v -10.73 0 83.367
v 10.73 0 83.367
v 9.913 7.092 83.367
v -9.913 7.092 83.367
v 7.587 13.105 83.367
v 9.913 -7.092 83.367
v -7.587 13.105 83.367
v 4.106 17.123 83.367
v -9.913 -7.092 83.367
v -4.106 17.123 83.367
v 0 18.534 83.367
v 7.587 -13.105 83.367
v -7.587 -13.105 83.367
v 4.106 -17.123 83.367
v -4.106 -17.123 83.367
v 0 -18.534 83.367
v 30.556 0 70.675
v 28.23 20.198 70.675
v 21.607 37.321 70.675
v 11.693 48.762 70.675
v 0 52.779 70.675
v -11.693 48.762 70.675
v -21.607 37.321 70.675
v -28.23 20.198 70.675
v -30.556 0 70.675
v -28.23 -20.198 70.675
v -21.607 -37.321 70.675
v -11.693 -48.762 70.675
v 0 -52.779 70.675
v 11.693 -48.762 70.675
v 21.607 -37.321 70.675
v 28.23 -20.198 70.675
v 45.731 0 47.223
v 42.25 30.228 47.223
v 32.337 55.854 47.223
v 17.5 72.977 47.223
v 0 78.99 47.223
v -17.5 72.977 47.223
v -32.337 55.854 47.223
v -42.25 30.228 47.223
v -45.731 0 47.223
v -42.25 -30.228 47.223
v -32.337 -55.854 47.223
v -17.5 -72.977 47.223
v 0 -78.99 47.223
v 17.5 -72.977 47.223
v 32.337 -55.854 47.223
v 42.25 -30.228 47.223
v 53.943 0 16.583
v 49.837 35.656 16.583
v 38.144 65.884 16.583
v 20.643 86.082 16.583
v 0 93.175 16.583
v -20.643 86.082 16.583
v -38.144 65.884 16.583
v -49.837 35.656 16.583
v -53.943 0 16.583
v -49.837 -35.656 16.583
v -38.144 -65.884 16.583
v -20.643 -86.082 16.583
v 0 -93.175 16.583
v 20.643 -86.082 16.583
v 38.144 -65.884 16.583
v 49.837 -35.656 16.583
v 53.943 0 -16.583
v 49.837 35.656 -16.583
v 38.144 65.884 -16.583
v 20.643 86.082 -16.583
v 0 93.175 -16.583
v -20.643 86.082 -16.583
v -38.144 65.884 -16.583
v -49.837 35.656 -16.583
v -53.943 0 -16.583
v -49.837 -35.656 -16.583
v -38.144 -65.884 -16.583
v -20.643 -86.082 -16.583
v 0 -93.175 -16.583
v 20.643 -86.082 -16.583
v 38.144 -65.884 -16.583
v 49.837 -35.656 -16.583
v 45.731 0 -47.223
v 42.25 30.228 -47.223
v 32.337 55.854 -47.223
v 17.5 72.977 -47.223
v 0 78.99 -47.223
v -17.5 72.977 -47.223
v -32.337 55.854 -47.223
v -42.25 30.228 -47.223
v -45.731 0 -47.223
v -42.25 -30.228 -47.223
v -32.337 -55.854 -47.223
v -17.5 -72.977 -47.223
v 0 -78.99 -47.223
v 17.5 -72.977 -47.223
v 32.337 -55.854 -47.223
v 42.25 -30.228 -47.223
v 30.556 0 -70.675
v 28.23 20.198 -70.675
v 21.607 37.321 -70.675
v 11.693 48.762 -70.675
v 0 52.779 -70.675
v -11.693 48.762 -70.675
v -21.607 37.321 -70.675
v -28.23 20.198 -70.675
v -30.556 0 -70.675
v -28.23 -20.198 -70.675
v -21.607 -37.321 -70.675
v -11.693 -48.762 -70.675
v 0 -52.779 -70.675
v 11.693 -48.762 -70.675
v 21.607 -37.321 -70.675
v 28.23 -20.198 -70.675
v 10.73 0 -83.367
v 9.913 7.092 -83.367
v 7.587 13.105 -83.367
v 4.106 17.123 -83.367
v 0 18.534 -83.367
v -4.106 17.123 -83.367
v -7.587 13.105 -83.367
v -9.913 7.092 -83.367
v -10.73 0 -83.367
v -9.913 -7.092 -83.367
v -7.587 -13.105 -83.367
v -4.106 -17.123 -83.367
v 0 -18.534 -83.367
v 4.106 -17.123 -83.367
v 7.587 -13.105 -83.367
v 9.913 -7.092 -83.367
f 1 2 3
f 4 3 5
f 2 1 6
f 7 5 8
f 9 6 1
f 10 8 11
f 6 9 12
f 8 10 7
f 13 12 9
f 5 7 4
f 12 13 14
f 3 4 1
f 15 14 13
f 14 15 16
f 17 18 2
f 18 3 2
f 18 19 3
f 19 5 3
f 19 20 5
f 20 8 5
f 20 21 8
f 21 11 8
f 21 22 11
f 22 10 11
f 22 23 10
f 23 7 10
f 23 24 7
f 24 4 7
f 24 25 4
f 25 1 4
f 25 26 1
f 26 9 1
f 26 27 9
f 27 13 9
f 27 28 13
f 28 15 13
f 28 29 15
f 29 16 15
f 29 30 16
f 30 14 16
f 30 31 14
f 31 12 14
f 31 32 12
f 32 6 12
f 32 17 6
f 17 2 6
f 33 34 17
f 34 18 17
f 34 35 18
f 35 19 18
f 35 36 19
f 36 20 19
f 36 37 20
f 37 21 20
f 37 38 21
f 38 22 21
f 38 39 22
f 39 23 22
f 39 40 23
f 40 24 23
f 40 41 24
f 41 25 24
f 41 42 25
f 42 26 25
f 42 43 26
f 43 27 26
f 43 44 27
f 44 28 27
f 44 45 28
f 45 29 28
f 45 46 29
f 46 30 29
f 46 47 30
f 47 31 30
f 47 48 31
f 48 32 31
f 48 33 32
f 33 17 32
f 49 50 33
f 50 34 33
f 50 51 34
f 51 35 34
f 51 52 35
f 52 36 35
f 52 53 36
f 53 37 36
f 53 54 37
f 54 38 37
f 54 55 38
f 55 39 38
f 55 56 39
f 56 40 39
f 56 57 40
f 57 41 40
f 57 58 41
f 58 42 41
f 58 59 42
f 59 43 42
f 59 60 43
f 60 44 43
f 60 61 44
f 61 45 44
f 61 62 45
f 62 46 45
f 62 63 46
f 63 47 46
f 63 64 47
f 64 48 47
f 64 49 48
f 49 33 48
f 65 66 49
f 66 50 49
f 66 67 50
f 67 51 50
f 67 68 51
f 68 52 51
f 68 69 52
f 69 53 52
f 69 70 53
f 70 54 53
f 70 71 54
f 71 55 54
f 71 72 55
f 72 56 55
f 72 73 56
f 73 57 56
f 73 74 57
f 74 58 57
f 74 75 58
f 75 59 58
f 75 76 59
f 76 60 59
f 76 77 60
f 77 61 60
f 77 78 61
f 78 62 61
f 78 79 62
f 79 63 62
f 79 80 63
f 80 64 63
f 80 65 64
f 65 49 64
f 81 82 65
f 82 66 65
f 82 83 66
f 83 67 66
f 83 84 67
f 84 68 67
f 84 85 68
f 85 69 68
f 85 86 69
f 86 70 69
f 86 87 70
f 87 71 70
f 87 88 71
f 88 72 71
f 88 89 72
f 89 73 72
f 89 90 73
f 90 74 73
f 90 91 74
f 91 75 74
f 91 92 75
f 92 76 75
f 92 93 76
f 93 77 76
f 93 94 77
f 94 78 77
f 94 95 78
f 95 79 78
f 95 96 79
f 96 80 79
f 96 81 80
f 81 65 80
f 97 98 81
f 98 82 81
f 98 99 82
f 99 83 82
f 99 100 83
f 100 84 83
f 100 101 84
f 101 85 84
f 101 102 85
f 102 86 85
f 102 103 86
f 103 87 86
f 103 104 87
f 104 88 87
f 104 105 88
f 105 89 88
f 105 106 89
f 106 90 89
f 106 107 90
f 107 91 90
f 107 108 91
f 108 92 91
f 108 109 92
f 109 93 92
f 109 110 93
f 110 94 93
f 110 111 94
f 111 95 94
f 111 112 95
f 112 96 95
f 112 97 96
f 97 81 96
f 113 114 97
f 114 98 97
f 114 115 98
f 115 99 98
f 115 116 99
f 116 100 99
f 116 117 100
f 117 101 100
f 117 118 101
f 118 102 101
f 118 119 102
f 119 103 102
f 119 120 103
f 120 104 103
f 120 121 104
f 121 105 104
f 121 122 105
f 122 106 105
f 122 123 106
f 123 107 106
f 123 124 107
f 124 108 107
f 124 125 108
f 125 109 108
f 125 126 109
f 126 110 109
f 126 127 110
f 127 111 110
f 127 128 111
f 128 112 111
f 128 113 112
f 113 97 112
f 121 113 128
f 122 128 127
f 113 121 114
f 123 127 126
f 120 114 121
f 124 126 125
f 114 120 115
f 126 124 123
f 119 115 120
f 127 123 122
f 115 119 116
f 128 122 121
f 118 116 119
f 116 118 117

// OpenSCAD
// Generated by SolidPython 1.0.1 on 2020-07-29 00:46:50


scale(v = [11, 19, 17]) {
	sphere(r = 5);
}
/***********************************************
*********      SolidPython code:      **********
************************************************
 
# import packages: SolidPython
from solid import *
from solid.utils import *
from itertools import chain, combinations, permutations


class Resize:

    def __init__(self, scad_file):
        self.scad_file = scad_file
        #self.scad_file = import_scad(scad_file)
        # cone/cylinder param:
        self.r1 = 0
        self.r2 = 0
        self.h = 0
        # rectangular prism param:
        self.w = 0
        self.l = 0
        # ellipse param:
        self.r = 0

    # import OpenScad code (file name corresponds to shape)


    # classify shape + parameters
    def assign(self, param1, param2, param3):
        if self.scad_file == 'cone.scad':
            self.r1 = param1
            self.r2 = param2
            self.h = param3
        elif self.scad_file == 'cylinder.scad':
            self.r1 = param1
            self.r2 = param2
            self.h = param3
        elif self.scad_file == 'rectangularPrism.scad':
            self.h = param1
            self.l = param2
            self.w = param3
        else:
            self.r = param1
            self.h = param2

    # resize parameters
    def iterate(self):
        x = range(3, 20, 2)
        i = 1
        if self.scad_file == 'cone.scad':
            tempList = list(permutations(x, 2))
            for temp in tempList:
                param1 = temp[0]
                param2 = temp[1]
                filepath = 'produced_scad_files/' + 'cone' + str(param1) + '_' + str(param2) + '_' + '.scad'
                scad_render_to_file(cylinder(h=param1, r1=param2, r2=0), filepath)

        elif self.scad_file == 'cylinder.scad':
            tempList = list(permutations(x, 3))
            for temp in tempList:
                param1 = temp[0]
                param2 = temp[1]
                filepath = 'produced_scad_files/' + 'cylinder' + str(param1) + '_' + str(param2) + '_' + '.scad'
                scad_render_to_file(cylinder(h=param1, r1=param2, r2=param2), filepath)

        elif self.scad_file == 'rectangularPrism.scad':
            tempList = list(permutations(x, 3))
            for temp in tempList:
                param1 = temp[0]
                param2 = temp[1]
                param3 = temp[2]
                filepath = 'produced_scad_files/' + 'rectangularPrism' + str(param1) + '_' + str(param2) + '_' + str(
                    param3) + '.scad'
                scad_render_to_file(cube(size=(param1, param2, param3)), filepath)

        elif self.scad_file == 'ellipse.scad':
            tempList = list(permutations(x, 4))
            for temp in tempList:
                param1 = temp[0]
                param2 = temp[1]
                param3 = temp[2]
                param4 = temp[3]
                filepath = 'produced_scad_files/' + 'ellipse' + str(param1) + '_' + str(param2) + '_' + str(param3) + '_' + str(param4) + '.scad'
                scad_render_to_file(scale([param1, param2, param3])(sphere(r=param4)), filepath)

    def render_to_scadfile(self):
        scad_render_to_file(scad, 'example.scad') 
 
************************************************/
